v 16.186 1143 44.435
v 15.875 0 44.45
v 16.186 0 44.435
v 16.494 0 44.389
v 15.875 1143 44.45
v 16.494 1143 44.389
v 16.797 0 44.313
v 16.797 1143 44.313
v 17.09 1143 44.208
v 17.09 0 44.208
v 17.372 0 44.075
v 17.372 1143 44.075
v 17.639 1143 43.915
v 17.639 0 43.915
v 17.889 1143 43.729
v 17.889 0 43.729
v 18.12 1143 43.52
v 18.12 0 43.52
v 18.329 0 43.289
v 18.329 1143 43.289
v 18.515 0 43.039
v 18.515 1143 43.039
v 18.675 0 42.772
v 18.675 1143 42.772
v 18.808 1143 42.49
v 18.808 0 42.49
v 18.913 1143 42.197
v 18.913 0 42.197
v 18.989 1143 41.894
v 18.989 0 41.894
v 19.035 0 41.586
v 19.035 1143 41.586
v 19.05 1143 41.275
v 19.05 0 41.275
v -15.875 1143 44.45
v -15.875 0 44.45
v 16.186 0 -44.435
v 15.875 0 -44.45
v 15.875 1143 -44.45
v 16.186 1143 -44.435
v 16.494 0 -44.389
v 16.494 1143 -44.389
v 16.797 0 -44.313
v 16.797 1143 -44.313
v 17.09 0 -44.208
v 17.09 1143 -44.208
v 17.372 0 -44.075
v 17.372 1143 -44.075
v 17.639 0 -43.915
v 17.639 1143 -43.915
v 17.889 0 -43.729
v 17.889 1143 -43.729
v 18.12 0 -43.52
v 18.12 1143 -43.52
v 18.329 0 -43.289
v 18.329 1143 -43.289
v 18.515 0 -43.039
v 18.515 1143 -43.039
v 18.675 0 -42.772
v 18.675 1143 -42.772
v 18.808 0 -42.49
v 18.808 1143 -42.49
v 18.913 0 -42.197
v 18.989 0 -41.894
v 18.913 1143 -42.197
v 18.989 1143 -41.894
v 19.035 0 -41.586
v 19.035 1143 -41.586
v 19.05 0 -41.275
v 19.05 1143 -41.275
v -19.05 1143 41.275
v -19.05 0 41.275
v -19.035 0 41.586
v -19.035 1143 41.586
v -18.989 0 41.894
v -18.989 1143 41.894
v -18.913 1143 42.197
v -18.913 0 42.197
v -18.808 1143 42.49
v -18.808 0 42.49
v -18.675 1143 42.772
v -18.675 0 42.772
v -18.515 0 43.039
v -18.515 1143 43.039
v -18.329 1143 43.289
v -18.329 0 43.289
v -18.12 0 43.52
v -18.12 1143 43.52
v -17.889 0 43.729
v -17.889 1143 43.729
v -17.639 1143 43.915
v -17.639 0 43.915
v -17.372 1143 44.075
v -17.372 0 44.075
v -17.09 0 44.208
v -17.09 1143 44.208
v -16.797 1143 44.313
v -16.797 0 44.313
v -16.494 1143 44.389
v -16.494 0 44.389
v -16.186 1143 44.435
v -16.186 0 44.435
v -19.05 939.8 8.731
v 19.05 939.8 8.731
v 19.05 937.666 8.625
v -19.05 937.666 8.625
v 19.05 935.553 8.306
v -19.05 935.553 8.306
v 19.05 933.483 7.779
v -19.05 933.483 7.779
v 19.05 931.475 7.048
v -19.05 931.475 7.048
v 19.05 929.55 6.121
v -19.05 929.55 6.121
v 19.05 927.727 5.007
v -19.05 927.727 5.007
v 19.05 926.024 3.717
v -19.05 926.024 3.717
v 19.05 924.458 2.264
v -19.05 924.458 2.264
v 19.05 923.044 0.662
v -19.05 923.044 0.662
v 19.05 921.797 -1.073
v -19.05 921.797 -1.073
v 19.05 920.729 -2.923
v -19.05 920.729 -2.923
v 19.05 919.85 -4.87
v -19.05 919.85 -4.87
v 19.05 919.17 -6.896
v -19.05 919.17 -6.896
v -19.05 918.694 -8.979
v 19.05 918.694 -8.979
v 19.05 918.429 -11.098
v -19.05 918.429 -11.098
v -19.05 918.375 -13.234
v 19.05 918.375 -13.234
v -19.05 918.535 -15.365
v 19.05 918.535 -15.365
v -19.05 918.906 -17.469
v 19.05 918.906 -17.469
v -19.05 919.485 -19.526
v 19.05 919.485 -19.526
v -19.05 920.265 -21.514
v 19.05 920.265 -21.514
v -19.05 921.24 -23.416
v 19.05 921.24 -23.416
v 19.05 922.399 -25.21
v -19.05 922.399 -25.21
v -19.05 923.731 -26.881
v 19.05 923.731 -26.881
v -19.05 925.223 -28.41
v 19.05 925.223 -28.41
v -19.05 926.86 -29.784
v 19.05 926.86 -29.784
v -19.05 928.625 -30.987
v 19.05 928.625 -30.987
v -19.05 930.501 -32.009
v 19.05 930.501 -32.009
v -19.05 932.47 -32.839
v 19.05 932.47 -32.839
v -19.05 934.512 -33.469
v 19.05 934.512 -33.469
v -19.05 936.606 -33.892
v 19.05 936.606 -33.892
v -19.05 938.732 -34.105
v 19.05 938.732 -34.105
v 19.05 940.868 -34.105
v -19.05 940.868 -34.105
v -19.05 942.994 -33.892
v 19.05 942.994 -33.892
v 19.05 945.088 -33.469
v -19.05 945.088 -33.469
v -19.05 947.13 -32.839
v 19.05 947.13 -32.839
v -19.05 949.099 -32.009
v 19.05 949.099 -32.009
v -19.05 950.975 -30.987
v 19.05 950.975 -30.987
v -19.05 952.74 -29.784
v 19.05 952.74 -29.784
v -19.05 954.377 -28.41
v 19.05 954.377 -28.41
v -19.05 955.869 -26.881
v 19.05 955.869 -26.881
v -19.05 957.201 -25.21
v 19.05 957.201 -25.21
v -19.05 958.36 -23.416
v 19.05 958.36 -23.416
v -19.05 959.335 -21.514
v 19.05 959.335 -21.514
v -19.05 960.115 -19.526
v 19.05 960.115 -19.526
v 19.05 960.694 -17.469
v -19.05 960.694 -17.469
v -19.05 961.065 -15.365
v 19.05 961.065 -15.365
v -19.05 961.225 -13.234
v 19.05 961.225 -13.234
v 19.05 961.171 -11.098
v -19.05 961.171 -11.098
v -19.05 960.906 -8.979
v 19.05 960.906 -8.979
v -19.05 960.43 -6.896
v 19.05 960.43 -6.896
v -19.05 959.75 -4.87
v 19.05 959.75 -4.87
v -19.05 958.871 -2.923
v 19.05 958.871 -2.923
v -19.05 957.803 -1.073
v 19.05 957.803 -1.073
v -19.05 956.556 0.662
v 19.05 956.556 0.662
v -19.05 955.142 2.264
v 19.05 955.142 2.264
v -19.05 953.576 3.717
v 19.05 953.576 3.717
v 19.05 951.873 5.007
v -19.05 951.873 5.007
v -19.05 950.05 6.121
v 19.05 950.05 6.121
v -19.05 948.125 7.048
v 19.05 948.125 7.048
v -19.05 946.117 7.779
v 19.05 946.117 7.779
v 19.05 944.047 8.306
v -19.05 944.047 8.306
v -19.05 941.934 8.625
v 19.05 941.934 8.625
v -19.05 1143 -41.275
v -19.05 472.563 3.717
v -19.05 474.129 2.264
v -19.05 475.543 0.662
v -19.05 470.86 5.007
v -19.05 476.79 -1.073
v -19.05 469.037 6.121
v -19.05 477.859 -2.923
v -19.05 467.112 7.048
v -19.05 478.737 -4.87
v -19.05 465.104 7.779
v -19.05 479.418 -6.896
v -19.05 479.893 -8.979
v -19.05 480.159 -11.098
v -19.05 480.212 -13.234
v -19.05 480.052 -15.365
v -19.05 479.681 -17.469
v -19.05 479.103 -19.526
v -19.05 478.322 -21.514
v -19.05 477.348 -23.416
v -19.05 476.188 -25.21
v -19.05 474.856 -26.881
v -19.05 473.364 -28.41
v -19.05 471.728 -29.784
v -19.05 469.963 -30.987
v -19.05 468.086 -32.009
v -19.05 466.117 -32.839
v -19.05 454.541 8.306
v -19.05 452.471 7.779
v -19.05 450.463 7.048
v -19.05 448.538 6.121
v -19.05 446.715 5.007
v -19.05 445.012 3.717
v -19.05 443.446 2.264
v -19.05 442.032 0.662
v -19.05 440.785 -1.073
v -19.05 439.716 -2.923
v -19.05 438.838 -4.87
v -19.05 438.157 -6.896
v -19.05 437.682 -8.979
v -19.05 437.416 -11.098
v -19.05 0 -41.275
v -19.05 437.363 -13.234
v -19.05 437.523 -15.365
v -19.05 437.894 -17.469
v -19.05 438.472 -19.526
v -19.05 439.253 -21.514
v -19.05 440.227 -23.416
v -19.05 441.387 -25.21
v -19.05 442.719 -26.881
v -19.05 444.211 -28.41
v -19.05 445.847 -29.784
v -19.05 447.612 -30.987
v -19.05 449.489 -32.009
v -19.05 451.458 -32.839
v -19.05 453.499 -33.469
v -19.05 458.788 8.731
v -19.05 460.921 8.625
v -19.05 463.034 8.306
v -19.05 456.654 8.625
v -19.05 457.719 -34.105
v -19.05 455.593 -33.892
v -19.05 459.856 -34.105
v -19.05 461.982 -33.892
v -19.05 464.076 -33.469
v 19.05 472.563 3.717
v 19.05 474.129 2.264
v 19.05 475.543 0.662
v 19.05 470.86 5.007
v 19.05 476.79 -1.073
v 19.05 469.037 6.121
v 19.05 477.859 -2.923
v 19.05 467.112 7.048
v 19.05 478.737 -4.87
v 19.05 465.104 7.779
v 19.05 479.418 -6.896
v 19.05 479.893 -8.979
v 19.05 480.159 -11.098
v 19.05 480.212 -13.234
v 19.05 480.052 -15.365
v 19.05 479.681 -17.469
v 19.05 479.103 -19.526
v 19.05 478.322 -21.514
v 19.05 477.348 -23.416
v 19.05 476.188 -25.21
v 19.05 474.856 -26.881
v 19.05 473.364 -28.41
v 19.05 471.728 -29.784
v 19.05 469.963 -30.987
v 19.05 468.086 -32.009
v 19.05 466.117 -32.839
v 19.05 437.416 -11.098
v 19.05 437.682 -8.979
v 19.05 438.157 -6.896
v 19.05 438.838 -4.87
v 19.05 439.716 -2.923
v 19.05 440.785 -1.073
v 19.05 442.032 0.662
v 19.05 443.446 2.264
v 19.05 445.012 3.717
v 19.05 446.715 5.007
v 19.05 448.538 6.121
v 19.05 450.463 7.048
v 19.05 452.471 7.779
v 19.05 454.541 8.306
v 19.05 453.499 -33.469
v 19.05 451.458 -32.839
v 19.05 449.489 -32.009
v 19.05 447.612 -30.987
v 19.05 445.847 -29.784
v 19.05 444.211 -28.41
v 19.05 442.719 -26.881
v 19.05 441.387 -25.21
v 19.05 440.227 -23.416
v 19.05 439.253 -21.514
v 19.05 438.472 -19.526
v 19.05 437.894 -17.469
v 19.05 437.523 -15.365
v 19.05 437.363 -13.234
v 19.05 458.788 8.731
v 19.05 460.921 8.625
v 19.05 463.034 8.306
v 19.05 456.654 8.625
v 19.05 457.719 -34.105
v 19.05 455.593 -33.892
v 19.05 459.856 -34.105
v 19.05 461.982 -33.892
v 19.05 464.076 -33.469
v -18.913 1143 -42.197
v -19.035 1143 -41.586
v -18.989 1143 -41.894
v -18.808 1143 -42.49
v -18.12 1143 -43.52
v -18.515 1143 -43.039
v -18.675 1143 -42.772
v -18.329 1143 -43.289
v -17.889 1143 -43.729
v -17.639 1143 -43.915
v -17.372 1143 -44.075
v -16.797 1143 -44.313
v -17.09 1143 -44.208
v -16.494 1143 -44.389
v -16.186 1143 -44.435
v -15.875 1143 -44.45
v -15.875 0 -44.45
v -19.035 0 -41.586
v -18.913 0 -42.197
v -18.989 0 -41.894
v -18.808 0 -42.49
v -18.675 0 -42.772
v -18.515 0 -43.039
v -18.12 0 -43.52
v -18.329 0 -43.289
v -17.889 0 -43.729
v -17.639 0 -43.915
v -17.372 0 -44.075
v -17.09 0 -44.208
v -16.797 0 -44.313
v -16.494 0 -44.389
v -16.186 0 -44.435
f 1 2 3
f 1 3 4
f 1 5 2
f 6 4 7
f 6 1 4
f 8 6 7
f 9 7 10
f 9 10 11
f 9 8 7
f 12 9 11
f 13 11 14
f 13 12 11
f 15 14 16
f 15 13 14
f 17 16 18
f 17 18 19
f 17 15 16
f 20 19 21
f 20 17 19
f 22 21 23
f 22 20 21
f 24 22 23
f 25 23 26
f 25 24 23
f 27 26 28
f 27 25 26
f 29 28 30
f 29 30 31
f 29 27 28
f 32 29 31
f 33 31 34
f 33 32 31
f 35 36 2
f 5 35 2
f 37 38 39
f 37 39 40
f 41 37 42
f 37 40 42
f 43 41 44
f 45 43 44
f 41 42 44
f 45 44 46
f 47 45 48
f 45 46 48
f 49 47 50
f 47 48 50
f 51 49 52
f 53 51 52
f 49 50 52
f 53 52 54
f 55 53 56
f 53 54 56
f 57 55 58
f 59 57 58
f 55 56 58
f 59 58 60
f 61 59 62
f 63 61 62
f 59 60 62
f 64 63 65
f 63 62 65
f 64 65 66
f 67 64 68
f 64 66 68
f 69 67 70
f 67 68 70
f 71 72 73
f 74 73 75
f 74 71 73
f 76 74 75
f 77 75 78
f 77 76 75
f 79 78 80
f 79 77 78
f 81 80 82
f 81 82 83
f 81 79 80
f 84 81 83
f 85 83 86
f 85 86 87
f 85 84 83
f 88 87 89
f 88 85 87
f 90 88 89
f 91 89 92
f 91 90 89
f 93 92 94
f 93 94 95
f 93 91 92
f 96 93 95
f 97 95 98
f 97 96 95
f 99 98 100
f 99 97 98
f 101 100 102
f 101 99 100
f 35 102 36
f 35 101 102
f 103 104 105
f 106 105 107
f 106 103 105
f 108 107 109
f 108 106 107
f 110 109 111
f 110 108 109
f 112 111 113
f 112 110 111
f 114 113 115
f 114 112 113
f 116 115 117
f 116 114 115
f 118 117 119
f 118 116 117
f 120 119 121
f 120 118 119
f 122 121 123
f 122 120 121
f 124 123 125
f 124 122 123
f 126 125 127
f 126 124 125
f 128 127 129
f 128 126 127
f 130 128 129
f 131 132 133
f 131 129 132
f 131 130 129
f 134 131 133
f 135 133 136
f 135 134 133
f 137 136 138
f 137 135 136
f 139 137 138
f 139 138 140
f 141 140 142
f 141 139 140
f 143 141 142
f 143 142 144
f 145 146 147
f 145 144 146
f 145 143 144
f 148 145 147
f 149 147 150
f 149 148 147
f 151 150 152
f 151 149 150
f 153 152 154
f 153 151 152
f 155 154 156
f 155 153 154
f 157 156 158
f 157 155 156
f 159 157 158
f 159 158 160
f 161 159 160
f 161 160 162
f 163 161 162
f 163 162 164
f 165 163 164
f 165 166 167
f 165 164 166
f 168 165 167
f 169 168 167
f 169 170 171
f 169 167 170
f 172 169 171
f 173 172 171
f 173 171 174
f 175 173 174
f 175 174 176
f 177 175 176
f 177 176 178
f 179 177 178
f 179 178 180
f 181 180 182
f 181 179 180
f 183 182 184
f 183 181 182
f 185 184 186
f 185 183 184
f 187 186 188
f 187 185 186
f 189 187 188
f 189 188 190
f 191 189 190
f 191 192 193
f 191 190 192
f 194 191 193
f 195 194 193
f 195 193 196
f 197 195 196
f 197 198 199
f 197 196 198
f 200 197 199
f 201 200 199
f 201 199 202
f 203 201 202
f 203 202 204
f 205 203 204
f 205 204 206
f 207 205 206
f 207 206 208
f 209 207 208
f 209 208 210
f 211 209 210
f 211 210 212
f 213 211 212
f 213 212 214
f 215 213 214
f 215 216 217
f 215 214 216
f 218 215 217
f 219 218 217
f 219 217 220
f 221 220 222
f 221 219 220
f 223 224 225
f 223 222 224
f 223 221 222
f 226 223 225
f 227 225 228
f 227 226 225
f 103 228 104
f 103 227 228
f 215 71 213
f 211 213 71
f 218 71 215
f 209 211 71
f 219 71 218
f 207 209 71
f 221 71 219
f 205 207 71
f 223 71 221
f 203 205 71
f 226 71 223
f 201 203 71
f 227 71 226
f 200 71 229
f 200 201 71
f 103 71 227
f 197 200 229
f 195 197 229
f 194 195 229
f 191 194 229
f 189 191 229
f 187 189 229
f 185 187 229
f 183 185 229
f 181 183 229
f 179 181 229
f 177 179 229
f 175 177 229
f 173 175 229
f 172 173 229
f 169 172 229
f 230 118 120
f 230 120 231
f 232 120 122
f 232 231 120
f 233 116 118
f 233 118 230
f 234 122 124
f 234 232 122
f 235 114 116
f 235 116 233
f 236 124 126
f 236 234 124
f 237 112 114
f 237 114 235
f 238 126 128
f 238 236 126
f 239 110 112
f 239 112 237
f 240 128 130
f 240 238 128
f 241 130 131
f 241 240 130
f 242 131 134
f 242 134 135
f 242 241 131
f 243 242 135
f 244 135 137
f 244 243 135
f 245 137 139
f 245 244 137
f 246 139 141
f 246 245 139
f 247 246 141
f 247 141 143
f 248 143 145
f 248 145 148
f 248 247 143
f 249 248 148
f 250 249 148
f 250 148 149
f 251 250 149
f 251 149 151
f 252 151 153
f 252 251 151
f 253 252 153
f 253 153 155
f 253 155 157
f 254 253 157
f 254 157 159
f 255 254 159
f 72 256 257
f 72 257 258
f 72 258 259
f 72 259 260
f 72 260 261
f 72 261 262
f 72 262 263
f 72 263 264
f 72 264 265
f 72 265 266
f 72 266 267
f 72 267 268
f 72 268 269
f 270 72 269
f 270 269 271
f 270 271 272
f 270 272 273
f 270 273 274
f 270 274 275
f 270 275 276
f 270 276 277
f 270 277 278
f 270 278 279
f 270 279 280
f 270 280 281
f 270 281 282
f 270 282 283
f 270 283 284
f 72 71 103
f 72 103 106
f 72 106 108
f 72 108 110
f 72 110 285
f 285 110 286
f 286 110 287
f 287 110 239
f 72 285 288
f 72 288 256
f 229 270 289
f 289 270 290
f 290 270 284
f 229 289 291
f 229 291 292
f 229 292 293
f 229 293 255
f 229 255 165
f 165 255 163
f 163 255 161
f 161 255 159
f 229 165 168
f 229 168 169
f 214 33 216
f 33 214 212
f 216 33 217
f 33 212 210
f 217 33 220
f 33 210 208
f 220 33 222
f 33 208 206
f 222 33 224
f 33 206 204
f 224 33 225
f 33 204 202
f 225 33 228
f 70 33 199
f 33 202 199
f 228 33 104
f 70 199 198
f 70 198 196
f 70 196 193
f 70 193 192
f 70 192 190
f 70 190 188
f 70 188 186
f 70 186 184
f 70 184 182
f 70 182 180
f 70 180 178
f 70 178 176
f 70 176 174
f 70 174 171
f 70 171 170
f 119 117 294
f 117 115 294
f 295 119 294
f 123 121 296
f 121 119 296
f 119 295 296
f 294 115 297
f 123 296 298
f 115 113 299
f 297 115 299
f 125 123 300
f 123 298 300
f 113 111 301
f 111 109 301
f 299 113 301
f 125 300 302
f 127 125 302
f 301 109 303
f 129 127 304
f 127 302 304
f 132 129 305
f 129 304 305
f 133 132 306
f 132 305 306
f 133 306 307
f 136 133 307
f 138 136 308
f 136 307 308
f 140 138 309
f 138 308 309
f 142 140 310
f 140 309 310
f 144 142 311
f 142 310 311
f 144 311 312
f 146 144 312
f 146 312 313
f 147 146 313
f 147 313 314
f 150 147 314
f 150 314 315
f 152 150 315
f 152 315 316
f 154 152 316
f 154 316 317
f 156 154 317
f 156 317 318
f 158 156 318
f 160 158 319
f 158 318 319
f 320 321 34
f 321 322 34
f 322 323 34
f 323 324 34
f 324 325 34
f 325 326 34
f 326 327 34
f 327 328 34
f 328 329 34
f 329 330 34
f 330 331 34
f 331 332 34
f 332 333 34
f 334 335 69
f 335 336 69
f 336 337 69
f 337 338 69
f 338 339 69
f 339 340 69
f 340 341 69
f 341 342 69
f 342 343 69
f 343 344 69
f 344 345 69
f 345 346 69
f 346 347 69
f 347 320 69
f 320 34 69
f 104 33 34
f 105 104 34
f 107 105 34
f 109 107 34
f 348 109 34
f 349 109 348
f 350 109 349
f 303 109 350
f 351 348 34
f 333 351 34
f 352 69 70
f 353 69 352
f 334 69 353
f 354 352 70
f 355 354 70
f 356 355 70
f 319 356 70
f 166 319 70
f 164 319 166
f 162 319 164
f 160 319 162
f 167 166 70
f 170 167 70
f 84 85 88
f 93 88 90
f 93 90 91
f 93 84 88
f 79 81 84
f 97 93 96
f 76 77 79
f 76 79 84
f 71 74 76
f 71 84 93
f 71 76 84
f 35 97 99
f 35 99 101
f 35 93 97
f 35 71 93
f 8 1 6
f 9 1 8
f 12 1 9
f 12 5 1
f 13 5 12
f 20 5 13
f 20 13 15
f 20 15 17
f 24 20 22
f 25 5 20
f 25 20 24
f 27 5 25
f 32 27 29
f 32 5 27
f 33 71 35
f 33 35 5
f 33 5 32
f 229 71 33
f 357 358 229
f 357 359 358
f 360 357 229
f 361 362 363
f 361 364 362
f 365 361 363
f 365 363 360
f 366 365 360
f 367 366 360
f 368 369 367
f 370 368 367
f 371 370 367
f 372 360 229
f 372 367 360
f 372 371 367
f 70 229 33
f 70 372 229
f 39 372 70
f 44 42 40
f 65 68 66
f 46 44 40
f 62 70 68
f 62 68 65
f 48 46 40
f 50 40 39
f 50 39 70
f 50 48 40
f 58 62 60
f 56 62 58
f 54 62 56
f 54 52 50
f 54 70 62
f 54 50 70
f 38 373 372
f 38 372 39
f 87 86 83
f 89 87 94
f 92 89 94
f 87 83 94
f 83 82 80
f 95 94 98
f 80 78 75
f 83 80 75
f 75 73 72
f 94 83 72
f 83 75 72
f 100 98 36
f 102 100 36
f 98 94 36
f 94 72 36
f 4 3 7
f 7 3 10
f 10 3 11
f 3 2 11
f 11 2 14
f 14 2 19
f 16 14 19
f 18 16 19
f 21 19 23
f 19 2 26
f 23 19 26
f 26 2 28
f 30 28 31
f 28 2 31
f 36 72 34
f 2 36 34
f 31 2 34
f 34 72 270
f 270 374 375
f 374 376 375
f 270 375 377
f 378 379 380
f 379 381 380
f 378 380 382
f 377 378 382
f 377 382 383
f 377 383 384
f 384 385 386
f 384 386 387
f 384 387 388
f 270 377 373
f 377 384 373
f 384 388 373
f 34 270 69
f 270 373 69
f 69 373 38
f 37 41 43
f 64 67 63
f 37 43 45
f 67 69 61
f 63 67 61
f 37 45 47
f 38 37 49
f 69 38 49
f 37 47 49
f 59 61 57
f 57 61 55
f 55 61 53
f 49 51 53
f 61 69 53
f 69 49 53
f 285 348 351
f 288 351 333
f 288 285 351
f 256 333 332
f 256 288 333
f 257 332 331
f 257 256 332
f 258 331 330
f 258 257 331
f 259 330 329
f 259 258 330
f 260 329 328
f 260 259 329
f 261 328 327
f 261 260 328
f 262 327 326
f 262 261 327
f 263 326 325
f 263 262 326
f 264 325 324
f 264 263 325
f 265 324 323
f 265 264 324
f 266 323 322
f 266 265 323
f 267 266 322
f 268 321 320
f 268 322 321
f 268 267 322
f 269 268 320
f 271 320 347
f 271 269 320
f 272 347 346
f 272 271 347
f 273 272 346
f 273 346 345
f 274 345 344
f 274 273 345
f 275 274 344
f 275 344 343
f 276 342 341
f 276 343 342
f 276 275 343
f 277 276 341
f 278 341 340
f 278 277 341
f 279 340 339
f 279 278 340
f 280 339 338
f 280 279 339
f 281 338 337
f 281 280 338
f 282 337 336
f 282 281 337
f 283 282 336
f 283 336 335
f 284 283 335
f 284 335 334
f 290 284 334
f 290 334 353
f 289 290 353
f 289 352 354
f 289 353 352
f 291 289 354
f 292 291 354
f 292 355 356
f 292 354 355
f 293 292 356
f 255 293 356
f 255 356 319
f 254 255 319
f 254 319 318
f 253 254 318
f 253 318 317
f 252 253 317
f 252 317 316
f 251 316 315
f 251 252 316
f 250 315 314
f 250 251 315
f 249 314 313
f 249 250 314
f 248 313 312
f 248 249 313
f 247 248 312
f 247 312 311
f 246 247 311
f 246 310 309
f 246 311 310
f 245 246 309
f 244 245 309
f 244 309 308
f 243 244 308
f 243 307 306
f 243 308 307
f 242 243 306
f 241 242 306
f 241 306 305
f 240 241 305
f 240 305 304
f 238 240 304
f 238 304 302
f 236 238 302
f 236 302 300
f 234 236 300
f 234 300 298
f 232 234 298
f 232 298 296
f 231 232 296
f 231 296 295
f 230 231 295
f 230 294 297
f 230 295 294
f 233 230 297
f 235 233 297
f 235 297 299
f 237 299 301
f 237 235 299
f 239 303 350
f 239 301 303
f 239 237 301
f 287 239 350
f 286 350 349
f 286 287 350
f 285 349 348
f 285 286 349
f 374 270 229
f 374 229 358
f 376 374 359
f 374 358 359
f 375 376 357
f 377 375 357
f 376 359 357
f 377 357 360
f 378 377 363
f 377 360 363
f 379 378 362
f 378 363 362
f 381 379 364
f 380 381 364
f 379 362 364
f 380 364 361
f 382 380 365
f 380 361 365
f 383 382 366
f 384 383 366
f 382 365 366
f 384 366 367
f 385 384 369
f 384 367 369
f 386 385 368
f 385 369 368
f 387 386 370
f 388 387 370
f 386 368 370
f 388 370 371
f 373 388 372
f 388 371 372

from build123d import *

# Parameters (mm, degrees)
SKETCH1_W           = 38.1
SKETCH1_H           = 88.9
BOSS_EXTRUDE1_DEPTH = 1143
SKETCH2_R           = 21.43125
CUT_EXTRUDE4_DEPTH  = 1145.498323502
FILLET1_R           = 3.175


with BuildPart() as part:
    # Sketch1 → Boss-Extrude1 (new body)
    with BuildSketch(Plane(origin=(0, 0, 0), x_dir=(1, 0, 0), z_dir=(0, 1, 0))):
        Rectangle(SKETCH1_W, SKETCH1_H)
    extrude(amount=BOSS_EXTRUDE1_DEPTH)

    # Sketch2 → Cut-Extrude4 (cut, through all)
    with BuildSketch(Plane(origin=(-19.05, 0, 0), x_dir=(0, 0, -1), z_dir=(1, 0, 0))):
        with Locations(Location((12.7, 458.7875, 0), (0, 0, 180))):
            Circle(SKETCH2_R)
        with Locations(Location((12.7, 939.8, 0), (0, 0, 180))):
            Circle(SKETCH2_R)
    extrude(amount=CUT_EXTRUDE4_DEPTH, mode=Mode.SUBTRACT)

    # Fillet1
    fillet1_edges = [part.edges().sort_by_distance(p)[0] for p in [
        (19.05, 571.5, 44.45),
        (-19.05, 571.5, 44.45),
        (-19.05, 571.5, -44.45),
        (19.05, 571.5, -44.45),
    ]]
    fillet(fillet1_edges, radius=FILLET1_R)


solid = part.part
